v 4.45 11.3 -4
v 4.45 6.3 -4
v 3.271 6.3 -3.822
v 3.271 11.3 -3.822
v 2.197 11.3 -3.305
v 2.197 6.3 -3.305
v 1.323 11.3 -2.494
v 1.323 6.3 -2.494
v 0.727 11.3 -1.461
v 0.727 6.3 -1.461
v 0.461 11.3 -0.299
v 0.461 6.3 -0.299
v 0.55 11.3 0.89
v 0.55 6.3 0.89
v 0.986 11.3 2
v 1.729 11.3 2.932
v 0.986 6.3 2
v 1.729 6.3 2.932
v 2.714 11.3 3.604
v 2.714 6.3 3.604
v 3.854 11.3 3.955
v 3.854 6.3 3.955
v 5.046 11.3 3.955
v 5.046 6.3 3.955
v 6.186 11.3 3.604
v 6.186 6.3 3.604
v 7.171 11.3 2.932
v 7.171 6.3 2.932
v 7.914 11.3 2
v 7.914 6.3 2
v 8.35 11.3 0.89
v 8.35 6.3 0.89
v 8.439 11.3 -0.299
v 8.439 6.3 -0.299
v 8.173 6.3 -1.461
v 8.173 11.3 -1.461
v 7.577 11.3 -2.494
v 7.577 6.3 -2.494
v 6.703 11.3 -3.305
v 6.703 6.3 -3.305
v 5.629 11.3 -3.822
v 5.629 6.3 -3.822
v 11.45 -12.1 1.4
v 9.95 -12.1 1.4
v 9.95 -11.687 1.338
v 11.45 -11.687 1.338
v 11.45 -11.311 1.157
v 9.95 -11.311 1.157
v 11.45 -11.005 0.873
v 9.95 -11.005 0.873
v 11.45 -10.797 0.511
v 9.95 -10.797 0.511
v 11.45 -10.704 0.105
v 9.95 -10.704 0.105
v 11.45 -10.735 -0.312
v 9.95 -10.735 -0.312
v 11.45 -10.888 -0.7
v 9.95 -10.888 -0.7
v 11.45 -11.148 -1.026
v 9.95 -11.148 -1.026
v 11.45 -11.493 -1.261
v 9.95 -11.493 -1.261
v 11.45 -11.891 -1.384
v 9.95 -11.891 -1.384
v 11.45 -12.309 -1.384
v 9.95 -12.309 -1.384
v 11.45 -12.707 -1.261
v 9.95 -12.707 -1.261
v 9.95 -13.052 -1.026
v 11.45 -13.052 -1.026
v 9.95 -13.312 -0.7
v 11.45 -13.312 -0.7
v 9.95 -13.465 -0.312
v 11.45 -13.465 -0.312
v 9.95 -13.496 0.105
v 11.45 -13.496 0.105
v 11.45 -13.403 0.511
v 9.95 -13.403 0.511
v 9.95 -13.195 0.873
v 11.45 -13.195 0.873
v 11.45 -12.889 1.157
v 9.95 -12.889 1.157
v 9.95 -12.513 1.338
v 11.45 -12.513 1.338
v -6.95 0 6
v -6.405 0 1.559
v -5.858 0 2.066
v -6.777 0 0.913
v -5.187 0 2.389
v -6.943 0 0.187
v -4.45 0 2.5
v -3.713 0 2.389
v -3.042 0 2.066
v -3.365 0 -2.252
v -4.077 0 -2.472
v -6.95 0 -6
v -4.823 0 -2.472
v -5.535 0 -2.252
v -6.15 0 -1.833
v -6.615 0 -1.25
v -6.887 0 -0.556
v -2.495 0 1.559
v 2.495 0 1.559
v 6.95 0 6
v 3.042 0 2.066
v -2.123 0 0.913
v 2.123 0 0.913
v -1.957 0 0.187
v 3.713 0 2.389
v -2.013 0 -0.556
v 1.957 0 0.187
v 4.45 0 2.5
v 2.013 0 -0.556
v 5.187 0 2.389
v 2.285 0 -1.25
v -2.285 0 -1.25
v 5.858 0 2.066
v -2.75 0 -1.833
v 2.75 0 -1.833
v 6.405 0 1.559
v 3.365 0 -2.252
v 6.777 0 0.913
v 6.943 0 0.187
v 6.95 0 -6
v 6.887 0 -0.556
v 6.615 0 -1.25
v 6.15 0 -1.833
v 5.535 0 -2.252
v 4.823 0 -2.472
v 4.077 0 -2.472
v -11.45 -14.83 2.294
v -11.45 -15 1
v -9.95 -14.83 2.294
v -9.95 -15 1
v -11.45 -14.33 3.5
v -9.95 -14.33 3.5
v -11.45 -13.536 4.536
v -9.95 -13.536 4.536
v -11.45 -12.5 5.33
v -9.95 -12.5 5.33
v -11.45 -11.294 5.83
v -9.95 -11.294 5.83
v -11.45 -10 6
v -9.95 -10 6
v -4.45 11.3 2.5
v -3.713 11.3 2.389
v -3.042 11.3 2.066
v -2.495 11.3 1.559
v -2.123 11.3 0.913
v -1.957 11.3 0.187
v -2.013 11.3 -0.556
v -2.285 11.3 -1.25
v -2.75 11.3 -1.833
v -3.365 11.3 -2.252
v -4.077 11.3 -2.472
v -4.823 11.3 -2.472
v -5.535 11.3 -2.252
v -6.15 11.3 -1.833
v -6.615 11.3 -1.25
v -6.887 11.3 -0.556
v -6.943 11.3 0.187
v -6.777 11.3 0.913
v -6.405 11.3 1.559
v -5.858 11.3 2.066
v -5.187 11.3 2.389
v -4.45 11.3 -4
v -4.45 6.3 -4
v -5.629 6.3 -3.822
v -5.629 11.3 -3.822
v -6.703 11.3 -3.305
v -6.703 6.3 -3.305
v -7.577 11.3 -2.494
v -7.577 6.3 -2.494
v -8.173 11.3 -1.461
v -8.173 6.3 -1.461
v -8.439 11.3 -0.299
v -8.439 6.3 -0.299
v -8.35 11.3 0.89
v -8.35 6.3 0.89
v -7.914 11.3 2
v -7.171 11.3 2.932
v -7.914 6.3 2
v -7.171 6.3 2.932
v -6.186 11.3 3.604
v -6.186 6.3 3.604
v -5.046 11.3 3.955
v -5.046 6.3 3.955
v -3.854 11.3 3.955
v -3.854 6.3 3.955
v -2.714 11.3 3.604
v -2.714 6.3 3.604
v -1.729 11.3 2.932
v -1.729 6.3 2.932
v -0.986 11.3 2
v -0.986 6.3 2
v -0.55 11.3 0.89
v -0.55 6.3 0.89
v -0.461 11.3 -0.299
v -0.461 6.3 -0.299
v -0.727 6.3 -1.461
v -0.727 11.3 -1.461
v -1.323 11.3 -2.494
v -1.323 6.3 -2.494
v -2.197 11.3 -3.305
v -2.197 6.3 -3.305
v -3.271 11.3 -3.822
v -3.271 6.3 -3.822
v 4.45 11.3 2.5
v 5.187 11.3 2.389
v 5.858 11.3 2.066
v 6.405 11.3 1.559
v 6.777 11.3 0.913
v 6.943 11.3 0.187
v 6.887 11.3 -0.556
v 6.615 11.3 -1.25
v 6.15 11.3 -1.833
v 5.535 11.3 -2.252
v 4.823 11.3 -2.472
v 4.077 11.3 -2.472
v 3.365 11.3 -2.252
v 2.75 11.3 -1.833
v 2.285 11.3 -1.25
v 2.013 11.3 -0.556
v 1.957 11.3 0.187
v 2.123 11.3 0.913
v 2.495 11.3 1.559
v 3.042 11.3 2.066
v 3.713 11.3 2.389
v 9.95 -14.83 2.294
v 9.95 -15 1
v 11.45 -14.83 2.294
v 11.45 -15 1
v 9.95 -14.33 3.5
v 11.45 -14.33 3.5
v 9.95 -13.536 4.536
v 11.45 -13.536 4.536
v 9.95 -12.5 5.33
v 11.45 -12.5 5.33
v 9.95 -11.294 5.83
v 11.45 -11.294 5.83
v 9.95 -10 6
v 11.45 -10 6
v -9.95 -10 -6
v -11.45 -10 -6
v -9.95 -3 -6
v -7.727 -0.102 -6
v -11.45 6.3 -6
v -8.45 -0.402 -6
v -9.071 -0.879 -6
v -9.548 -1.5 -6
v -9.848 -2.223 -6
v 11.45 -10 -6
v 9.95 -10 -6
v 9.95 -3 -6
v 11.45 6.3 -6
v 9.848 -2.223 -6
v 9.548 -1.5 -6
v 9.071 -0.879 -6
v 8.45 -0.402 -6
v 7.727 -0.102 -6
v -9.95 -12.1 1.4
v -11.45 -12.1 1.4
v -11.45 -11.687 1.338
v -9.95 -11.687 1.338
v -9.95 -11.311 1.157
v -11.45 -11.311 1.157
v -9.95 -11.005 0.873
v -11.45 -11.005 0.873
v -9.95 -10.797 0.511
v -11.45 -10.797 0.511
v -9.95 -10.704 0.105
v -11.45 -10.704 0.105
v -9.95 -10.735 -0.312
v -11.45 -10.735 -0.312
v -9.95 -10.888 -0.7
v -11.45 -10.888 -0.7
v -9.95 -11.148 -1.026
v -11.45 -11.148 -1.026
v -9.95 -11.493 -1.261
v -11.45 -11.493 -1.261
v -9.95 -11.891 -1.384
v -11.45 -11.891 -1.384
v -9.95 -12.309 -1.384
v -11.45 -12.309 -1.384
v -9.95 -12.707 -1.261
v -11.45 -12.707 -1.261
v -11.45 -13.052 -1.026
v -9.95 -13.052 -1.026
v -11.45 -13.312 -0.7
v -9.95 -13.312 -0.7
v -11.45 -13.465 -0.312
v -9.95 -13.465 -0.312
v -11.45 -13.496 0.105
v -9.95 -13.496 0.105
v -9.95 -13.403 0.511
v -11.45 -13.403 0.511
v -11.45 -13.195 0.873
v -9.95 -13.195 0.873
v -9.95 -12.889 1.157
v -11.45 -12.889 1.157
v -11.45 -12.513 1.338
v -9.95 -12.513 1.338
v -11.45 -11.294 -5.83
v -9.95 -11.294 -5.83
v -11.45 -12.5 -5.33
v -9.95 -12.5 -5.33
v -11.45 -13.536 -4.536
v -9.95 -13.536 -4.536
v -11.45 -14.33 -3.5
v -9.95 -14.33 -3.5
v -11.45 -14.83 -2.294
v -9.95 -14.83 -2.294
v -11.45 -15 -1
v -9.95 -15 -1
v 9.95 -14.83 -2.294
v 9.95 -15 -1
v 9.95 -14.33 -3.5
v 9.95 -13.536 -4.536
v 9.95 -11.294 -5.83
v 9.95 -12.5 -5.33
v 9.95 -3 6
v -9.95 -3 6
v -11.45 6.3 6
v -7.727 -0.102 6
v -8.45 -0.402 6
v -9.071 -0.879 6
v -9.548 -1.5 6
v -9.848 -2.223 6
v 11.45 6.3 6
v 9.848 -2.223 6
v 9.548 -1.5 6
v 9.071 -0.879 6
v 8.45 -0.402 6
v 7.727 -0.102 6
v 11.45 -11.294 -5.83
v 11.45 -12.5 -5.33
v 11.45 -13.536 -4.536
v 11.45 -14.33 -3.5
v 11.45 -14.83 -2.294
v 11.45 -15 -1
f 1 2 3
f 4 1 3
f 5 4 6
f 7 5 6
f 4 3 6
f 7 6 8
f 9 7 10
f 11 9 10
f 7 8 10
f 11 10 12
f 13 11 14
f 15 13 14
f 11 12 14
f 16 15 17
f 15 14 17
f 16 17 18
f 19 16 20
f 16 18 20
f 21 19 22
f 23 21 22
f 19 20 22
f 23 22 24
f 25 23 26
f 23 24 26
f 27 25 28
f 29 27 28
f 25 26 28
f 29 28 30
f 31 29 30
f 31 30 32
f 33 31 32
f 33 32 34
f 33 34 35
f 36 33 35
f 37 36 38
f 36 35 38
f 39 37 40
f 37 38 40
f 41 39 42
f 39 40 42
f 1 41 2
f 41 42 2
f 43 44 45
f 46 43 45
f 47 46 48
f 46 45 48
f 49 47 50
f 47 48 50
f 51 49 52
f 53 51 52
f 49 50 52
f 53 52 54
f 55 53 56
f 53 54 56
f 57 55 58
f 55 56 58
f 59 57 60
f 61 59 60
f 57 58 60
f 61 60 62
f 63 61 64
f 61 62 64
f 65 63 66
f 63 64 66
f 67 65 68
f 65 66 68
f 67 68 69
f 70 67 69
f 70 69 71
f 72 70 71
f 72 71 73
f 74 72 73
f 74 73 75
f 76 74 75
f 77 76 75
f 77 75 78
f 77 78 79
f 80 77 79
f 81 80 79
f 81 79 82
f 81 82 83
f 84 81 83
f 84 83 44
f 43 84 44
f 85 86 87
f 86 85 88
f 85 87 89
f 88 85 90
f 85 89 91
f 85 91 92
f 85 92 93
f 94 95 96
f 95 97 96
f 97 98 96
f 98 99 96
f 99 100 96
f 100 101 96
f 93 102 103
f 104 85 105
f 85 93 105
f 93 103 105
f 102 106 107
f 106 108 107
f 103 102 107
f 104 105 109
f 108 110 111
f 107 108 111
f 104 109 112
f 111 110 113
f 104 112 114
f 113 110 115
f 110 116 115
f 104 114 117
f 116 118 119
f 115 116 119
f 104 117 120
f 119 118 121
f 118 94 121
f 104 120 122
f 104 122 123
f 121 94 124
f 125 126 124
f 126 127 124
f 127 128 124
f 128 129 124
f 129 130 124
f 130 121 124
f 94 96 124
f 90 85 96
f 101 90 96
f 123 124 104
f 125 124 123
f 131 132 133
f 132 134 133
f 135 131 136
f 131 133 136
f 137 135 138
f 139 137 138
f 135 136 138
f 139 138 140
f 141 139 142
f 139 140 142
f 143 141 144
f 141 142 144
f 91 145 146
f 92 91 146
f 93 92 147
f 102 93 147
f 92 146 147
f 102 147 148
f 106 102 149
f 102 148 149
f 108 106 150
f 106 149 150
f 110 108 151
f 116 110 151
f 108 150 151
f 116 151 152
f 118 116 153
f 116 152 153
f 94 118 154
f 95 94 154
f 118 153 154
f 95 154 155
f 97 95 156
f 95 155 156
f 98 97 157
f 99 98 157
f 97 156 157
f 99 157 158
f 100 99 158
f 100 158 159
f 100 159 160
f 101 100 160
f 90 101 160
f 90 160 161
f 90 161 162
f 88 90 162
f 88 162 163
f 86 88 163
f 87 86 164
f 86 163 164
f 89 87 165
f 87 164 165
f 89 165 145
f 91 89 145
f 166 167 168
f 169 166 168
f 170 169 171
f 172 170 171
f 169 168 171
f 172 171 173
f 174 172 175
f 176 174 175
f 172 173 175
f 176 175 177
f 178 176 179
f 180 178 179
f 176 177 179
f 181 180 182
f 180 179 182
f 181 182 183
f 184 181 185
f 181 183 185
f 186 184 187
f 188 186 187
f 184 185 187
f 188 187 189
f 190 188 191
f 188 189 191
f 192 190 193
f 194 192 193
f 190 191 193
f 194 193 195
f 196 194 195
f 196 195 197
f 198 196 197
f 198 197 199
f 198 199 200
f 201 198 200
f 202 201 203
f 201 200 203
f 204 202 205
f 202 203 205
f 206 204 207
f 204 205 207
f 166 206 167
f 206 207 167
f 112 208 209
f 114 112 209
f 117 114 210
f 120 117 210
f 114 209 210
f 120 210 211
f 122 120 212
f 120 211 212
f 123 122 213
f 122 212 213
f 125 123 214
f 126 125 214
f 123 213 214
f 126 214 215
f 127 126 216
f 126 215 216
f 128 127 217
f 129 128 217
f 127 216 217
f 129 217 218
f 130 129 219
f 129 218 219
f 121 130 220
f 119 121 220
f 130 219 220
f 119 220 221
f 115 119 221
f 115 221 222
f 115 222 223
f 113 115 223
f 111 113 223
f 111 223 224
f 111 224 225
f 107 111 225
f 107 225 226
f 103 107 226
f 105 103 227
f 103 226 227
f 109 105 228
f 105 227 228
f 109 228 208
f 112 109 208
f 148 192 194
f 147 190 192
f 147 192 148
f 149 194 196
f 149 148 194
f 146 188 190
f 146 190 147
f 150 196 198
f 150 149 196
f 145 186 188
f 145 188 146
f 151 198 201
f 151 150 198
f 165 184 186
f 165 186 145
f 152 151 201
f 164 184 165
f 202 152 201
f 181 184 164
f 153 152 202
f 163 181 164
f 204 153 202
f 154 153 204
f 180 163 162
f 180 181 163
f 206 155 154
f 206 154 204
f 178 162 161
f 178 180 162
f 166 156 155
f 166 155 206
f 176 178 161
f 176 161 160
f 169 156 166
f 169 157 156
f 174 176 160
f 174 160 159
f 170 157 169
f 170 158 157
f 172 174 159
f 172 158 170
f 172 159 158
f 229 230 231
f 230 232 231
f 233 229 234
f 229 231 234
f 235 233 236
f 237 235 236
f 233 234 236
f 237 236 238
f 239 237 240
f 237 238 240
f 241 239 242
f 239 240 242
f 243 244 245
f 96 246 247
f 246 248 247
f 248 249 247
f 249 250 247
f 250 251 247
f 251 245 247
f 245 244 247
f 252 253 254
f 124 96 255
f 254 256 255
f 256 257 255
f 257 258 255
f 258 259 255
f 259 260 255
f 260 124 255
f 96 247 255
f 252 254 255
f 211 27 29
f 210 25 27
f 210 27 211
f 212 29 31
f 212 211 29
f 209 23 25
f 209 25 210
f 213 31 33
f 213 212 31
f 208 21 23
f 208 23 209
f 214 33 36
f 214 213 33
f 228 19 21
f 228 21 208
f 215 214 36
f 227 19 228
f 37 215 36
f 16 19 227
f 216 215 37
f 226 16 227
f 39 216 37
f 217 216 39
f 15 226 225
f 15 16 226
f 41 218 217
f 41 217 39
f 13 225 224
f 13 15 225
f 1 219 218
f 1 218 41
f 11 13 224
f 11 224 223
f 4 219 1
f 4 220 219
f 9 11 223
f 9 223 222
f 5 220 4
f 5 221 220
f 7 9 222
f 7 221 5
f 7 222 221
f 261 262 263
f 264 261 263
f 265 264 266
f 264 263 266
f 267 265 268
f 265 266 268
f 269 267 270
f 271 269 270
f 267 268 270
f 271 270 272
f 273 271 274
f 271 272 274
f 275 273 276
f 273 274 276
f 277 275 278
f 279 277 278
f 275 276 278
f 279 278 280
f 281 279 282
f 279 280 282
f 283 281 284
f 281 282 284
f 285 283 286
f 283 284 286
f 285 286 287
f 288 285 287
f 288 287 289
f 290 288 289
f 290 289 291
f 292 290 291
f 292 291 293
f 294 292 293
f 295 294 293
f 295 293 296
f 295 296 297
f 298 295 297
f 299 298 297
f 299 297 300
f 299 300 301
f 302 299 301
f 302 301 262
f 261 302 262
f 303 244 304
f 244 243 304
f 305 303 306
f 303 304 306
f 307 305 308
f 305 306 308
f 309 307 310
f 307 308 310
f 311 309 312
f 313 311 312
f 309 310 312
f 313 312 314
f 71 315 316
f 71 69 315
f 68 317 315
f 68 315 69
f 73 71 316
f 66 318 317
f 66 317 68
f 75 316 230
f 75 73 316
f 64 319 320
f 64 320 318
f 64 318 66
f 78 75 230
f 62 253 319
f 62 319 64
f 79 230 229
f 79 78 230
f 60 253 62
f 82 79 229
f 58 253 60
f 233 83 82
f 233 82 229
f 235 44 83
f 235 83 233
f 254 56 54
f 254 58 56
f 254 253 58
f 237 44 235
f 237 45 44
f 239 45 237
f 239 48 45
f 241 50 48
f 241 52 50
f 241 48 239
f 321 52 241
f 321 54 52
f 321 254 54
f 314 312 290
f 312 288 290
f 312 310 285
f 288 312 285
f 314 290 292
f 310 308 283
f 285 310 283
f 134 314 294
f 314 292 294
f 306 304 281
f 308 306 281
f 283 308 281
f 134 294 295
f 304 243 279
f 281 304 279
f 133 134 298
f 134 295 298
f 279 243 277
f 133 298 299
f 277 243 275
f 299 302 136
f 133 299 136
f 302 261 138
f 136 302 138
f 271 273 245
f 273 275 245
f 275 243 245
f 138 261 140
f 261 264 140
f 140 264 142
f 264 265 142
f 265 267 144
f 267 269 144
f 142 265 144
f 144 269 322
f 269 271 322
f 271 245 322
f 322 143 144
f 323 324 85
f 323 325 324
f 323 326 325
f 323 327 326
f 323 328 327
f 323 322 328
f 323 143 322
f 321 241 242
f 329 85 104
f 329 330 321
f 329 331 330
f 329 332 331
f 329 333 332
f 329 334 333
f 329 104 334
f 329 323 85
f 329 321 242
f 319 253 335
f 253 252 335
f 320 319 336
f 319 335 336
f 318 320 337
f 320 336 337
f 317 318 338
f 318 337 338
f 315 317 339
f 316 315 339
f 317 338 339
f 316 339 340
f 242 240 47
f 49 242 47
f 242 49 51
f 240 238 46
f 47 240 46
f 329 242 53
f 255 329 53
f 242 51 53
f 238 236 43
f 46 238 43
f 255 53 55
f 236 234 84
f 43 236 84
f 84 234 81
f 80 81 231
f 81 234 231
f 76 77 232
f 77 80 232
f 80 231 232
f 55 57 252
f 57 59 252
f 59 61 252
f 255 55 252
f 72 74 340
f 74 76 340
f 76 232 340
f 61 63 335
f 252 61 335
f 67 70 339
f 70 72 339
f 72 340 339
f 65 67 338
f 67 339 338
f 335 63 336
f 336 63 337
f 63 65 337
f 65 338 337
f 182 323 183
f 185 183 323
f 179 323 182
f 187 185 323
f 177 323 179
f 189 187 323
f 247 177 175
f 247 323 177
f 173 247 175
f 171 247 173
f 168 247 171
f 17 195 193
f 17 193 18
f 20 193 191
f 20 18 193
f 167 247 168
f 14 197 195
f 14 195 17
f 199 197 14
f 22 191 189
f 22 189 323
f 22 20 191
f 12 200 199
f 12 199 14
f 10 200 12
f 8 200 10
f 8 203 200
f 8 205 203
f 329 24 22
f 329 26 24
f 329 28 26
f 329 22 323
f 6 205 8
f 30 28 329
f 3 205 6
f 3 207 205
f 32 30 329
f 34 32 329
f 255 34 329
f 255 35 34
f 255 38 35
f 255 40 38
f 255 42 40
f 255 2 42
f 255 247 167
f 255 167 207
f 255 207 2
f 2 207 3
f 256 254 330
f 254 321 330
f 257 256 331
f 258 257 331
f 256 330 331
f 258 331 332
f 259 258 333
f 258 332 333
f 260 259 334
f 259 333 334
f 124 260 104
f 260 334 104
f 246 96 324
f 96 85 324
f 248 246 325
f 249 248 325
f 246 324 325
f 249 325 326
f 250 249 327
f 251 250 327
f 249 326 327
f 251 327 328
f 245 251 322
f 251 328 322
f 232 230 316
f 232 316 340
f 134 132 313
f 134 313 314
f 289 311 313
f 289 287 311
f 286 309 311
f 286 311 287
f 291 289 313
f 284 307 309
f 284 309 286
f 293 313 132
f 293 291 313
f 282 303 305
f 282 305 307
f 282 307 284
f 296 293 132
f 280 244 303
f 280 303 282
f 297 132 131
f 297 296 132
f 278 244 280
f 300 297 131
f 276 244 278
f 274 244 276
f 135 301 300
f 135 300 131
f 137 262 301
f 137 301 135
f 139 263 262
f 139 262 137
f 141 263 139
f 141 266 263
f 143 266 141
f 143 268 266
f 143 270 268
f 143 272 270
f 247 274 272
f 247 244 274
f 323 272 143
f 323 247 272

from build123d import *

# Parameters (mm, degrees)
BOSS_EXTRUDE1_OUTLINE_W = 22.9
BOSS_EXTRUDE1_OUTLINE_H = 12
BOSS_EXTRUDE1_DEPTH     = 6.3
SKETCH2_R               = 4
BOSS_EXTRUDE2_DEPTH     = 5
SKETCH3_R               = 2.5
CUT_EXTRUDE1_DEPTH      = 11.3
SKETCH4_W               = 1.5
SKETCH4_H               = 12
BOSS_EXTRUDE3_DEPTH     = 15
FILLET1_R               = 3
CUT_EXTRUDE2_REACH      = 30.025
SKETCH5_R               = 1.4
FILLET2_R               = 5


# Read off the part's stored shape, not the designer's step: Boss-Extrude1
with BuildPart() as part:
    # Boss-Extrude1 outline → Boss-Extrude1 (new body)
    with BuildSketch(Plane(origin=(0, 0, 0), x_dir=(1, 0, 0), z_dir=(0, 1, 0))):
        Rectangle(BOSS_EXTRUDE1_OUTLINE_W, BOSS_EXTRUDE1_OUTLINE_H)
    extrude(amount=BOSS_EXTRUDE1_DEPTH)

    # Sketch2 → Boss-Extrude2 (add)
    with BuildSketch(Plane(origin=(0, 6.3, 0), x_dir=(1, 0, 0), z_dir=(0, 1, 0))):
        with Locations(Location((-4.45, 0, 0), (0, 0, 90))):
            Circle(SKETCH2_R)
        with Locations(Location((4.45, 0, 0), (0, 0, 90))):
            Circle(SKETCH2_R)
    extrude(amount=BOSS_EXTRUDE2_DEPTH)

    # Sketch3 → Cut-Extrude1 (cut)
    with BuildSketch(Plane(origin=(0, 11.3, 0), x_dir=(1, 0, 0), z_dir=(0, 1, 0))):
        with Locations(Location((4.45, 0, 0), (0, 0, 270))):
            Circle(SKETCH3_R)
        with Locations(Location((-4.45, 0, 0), (0, 0, 270))):
            Circle(SKETCH3_R)
    extrude(amount=-CUT_EXTRUDE1_DEPTH, mode=Mode.SUBTRACT)

    # Sketch4 → Boss-Extrude3 (add)
    with BuildSketch(Plane.XZ):
        with Locations((-10.7, 0)):
            Rectangle(SKETCH4_W, SKETCH4_H)
        with Locations((10.7, 0)):
            Rectangle(SKETCH4_W, SKETCH4_H)
    extrude(amount=BOSS_EXTRUDE3_DEPTH)

    # Fillet1
    fillet1_edges = [part.edges().sort_by_distance(p)[0] for p in [
        (9.95, 0, 0),
        (-9.95, 0, 0),
    ]]
    fillet(fillet1_edges, radius=FILLET1_R - 0.0001)  # a hair under: the kernel refuses the full size

    # Cut-Extrude2: up to this face of the body (flat: up to its plane)
    cut_extrude2_end = Plane(part.part.faces().sort_by_distance((11.45, -4.35, 0))[0])
    # Sketch5 → Cut-Extrude2 (cut, up to the picked face)
    with BuildSketch(Plane.ZY.offset(11.45), mode=Mode.PRIVATE) as cut_extrude2_sk1:
        with Locations((0, -12.1)):
            Circle(SKETCH5_R)
    cut_extrude2_tool1 = split(extrude(cut_extrude2_sk1.sketch, amount=-CUT_EXTRUDE2_REACH, mode=Mode.PRIVATE), bisect_by=cut_extrude2_end, keep=Keep.BOTH, mode=Mode.PRIVATE)
    add(cut_extrude2_tool1.solids().sort_by(Axis((-11.45, -12.1, 0), (1, 0, 0)))[0], mode=Mode.SUBTRACT)

    # Fillet2
    fillet2_edges = [part.edges().sort_by_distance(p)[0] for p in [
        (-10.7, -15, -6),
        (-10.7, -15, 6),
        (10.7, -15, -6),
        (10.7, -15, 6),
    ]]
    fillet(fillet2_edges, radius=FILLET2_R)


solid = part.part
